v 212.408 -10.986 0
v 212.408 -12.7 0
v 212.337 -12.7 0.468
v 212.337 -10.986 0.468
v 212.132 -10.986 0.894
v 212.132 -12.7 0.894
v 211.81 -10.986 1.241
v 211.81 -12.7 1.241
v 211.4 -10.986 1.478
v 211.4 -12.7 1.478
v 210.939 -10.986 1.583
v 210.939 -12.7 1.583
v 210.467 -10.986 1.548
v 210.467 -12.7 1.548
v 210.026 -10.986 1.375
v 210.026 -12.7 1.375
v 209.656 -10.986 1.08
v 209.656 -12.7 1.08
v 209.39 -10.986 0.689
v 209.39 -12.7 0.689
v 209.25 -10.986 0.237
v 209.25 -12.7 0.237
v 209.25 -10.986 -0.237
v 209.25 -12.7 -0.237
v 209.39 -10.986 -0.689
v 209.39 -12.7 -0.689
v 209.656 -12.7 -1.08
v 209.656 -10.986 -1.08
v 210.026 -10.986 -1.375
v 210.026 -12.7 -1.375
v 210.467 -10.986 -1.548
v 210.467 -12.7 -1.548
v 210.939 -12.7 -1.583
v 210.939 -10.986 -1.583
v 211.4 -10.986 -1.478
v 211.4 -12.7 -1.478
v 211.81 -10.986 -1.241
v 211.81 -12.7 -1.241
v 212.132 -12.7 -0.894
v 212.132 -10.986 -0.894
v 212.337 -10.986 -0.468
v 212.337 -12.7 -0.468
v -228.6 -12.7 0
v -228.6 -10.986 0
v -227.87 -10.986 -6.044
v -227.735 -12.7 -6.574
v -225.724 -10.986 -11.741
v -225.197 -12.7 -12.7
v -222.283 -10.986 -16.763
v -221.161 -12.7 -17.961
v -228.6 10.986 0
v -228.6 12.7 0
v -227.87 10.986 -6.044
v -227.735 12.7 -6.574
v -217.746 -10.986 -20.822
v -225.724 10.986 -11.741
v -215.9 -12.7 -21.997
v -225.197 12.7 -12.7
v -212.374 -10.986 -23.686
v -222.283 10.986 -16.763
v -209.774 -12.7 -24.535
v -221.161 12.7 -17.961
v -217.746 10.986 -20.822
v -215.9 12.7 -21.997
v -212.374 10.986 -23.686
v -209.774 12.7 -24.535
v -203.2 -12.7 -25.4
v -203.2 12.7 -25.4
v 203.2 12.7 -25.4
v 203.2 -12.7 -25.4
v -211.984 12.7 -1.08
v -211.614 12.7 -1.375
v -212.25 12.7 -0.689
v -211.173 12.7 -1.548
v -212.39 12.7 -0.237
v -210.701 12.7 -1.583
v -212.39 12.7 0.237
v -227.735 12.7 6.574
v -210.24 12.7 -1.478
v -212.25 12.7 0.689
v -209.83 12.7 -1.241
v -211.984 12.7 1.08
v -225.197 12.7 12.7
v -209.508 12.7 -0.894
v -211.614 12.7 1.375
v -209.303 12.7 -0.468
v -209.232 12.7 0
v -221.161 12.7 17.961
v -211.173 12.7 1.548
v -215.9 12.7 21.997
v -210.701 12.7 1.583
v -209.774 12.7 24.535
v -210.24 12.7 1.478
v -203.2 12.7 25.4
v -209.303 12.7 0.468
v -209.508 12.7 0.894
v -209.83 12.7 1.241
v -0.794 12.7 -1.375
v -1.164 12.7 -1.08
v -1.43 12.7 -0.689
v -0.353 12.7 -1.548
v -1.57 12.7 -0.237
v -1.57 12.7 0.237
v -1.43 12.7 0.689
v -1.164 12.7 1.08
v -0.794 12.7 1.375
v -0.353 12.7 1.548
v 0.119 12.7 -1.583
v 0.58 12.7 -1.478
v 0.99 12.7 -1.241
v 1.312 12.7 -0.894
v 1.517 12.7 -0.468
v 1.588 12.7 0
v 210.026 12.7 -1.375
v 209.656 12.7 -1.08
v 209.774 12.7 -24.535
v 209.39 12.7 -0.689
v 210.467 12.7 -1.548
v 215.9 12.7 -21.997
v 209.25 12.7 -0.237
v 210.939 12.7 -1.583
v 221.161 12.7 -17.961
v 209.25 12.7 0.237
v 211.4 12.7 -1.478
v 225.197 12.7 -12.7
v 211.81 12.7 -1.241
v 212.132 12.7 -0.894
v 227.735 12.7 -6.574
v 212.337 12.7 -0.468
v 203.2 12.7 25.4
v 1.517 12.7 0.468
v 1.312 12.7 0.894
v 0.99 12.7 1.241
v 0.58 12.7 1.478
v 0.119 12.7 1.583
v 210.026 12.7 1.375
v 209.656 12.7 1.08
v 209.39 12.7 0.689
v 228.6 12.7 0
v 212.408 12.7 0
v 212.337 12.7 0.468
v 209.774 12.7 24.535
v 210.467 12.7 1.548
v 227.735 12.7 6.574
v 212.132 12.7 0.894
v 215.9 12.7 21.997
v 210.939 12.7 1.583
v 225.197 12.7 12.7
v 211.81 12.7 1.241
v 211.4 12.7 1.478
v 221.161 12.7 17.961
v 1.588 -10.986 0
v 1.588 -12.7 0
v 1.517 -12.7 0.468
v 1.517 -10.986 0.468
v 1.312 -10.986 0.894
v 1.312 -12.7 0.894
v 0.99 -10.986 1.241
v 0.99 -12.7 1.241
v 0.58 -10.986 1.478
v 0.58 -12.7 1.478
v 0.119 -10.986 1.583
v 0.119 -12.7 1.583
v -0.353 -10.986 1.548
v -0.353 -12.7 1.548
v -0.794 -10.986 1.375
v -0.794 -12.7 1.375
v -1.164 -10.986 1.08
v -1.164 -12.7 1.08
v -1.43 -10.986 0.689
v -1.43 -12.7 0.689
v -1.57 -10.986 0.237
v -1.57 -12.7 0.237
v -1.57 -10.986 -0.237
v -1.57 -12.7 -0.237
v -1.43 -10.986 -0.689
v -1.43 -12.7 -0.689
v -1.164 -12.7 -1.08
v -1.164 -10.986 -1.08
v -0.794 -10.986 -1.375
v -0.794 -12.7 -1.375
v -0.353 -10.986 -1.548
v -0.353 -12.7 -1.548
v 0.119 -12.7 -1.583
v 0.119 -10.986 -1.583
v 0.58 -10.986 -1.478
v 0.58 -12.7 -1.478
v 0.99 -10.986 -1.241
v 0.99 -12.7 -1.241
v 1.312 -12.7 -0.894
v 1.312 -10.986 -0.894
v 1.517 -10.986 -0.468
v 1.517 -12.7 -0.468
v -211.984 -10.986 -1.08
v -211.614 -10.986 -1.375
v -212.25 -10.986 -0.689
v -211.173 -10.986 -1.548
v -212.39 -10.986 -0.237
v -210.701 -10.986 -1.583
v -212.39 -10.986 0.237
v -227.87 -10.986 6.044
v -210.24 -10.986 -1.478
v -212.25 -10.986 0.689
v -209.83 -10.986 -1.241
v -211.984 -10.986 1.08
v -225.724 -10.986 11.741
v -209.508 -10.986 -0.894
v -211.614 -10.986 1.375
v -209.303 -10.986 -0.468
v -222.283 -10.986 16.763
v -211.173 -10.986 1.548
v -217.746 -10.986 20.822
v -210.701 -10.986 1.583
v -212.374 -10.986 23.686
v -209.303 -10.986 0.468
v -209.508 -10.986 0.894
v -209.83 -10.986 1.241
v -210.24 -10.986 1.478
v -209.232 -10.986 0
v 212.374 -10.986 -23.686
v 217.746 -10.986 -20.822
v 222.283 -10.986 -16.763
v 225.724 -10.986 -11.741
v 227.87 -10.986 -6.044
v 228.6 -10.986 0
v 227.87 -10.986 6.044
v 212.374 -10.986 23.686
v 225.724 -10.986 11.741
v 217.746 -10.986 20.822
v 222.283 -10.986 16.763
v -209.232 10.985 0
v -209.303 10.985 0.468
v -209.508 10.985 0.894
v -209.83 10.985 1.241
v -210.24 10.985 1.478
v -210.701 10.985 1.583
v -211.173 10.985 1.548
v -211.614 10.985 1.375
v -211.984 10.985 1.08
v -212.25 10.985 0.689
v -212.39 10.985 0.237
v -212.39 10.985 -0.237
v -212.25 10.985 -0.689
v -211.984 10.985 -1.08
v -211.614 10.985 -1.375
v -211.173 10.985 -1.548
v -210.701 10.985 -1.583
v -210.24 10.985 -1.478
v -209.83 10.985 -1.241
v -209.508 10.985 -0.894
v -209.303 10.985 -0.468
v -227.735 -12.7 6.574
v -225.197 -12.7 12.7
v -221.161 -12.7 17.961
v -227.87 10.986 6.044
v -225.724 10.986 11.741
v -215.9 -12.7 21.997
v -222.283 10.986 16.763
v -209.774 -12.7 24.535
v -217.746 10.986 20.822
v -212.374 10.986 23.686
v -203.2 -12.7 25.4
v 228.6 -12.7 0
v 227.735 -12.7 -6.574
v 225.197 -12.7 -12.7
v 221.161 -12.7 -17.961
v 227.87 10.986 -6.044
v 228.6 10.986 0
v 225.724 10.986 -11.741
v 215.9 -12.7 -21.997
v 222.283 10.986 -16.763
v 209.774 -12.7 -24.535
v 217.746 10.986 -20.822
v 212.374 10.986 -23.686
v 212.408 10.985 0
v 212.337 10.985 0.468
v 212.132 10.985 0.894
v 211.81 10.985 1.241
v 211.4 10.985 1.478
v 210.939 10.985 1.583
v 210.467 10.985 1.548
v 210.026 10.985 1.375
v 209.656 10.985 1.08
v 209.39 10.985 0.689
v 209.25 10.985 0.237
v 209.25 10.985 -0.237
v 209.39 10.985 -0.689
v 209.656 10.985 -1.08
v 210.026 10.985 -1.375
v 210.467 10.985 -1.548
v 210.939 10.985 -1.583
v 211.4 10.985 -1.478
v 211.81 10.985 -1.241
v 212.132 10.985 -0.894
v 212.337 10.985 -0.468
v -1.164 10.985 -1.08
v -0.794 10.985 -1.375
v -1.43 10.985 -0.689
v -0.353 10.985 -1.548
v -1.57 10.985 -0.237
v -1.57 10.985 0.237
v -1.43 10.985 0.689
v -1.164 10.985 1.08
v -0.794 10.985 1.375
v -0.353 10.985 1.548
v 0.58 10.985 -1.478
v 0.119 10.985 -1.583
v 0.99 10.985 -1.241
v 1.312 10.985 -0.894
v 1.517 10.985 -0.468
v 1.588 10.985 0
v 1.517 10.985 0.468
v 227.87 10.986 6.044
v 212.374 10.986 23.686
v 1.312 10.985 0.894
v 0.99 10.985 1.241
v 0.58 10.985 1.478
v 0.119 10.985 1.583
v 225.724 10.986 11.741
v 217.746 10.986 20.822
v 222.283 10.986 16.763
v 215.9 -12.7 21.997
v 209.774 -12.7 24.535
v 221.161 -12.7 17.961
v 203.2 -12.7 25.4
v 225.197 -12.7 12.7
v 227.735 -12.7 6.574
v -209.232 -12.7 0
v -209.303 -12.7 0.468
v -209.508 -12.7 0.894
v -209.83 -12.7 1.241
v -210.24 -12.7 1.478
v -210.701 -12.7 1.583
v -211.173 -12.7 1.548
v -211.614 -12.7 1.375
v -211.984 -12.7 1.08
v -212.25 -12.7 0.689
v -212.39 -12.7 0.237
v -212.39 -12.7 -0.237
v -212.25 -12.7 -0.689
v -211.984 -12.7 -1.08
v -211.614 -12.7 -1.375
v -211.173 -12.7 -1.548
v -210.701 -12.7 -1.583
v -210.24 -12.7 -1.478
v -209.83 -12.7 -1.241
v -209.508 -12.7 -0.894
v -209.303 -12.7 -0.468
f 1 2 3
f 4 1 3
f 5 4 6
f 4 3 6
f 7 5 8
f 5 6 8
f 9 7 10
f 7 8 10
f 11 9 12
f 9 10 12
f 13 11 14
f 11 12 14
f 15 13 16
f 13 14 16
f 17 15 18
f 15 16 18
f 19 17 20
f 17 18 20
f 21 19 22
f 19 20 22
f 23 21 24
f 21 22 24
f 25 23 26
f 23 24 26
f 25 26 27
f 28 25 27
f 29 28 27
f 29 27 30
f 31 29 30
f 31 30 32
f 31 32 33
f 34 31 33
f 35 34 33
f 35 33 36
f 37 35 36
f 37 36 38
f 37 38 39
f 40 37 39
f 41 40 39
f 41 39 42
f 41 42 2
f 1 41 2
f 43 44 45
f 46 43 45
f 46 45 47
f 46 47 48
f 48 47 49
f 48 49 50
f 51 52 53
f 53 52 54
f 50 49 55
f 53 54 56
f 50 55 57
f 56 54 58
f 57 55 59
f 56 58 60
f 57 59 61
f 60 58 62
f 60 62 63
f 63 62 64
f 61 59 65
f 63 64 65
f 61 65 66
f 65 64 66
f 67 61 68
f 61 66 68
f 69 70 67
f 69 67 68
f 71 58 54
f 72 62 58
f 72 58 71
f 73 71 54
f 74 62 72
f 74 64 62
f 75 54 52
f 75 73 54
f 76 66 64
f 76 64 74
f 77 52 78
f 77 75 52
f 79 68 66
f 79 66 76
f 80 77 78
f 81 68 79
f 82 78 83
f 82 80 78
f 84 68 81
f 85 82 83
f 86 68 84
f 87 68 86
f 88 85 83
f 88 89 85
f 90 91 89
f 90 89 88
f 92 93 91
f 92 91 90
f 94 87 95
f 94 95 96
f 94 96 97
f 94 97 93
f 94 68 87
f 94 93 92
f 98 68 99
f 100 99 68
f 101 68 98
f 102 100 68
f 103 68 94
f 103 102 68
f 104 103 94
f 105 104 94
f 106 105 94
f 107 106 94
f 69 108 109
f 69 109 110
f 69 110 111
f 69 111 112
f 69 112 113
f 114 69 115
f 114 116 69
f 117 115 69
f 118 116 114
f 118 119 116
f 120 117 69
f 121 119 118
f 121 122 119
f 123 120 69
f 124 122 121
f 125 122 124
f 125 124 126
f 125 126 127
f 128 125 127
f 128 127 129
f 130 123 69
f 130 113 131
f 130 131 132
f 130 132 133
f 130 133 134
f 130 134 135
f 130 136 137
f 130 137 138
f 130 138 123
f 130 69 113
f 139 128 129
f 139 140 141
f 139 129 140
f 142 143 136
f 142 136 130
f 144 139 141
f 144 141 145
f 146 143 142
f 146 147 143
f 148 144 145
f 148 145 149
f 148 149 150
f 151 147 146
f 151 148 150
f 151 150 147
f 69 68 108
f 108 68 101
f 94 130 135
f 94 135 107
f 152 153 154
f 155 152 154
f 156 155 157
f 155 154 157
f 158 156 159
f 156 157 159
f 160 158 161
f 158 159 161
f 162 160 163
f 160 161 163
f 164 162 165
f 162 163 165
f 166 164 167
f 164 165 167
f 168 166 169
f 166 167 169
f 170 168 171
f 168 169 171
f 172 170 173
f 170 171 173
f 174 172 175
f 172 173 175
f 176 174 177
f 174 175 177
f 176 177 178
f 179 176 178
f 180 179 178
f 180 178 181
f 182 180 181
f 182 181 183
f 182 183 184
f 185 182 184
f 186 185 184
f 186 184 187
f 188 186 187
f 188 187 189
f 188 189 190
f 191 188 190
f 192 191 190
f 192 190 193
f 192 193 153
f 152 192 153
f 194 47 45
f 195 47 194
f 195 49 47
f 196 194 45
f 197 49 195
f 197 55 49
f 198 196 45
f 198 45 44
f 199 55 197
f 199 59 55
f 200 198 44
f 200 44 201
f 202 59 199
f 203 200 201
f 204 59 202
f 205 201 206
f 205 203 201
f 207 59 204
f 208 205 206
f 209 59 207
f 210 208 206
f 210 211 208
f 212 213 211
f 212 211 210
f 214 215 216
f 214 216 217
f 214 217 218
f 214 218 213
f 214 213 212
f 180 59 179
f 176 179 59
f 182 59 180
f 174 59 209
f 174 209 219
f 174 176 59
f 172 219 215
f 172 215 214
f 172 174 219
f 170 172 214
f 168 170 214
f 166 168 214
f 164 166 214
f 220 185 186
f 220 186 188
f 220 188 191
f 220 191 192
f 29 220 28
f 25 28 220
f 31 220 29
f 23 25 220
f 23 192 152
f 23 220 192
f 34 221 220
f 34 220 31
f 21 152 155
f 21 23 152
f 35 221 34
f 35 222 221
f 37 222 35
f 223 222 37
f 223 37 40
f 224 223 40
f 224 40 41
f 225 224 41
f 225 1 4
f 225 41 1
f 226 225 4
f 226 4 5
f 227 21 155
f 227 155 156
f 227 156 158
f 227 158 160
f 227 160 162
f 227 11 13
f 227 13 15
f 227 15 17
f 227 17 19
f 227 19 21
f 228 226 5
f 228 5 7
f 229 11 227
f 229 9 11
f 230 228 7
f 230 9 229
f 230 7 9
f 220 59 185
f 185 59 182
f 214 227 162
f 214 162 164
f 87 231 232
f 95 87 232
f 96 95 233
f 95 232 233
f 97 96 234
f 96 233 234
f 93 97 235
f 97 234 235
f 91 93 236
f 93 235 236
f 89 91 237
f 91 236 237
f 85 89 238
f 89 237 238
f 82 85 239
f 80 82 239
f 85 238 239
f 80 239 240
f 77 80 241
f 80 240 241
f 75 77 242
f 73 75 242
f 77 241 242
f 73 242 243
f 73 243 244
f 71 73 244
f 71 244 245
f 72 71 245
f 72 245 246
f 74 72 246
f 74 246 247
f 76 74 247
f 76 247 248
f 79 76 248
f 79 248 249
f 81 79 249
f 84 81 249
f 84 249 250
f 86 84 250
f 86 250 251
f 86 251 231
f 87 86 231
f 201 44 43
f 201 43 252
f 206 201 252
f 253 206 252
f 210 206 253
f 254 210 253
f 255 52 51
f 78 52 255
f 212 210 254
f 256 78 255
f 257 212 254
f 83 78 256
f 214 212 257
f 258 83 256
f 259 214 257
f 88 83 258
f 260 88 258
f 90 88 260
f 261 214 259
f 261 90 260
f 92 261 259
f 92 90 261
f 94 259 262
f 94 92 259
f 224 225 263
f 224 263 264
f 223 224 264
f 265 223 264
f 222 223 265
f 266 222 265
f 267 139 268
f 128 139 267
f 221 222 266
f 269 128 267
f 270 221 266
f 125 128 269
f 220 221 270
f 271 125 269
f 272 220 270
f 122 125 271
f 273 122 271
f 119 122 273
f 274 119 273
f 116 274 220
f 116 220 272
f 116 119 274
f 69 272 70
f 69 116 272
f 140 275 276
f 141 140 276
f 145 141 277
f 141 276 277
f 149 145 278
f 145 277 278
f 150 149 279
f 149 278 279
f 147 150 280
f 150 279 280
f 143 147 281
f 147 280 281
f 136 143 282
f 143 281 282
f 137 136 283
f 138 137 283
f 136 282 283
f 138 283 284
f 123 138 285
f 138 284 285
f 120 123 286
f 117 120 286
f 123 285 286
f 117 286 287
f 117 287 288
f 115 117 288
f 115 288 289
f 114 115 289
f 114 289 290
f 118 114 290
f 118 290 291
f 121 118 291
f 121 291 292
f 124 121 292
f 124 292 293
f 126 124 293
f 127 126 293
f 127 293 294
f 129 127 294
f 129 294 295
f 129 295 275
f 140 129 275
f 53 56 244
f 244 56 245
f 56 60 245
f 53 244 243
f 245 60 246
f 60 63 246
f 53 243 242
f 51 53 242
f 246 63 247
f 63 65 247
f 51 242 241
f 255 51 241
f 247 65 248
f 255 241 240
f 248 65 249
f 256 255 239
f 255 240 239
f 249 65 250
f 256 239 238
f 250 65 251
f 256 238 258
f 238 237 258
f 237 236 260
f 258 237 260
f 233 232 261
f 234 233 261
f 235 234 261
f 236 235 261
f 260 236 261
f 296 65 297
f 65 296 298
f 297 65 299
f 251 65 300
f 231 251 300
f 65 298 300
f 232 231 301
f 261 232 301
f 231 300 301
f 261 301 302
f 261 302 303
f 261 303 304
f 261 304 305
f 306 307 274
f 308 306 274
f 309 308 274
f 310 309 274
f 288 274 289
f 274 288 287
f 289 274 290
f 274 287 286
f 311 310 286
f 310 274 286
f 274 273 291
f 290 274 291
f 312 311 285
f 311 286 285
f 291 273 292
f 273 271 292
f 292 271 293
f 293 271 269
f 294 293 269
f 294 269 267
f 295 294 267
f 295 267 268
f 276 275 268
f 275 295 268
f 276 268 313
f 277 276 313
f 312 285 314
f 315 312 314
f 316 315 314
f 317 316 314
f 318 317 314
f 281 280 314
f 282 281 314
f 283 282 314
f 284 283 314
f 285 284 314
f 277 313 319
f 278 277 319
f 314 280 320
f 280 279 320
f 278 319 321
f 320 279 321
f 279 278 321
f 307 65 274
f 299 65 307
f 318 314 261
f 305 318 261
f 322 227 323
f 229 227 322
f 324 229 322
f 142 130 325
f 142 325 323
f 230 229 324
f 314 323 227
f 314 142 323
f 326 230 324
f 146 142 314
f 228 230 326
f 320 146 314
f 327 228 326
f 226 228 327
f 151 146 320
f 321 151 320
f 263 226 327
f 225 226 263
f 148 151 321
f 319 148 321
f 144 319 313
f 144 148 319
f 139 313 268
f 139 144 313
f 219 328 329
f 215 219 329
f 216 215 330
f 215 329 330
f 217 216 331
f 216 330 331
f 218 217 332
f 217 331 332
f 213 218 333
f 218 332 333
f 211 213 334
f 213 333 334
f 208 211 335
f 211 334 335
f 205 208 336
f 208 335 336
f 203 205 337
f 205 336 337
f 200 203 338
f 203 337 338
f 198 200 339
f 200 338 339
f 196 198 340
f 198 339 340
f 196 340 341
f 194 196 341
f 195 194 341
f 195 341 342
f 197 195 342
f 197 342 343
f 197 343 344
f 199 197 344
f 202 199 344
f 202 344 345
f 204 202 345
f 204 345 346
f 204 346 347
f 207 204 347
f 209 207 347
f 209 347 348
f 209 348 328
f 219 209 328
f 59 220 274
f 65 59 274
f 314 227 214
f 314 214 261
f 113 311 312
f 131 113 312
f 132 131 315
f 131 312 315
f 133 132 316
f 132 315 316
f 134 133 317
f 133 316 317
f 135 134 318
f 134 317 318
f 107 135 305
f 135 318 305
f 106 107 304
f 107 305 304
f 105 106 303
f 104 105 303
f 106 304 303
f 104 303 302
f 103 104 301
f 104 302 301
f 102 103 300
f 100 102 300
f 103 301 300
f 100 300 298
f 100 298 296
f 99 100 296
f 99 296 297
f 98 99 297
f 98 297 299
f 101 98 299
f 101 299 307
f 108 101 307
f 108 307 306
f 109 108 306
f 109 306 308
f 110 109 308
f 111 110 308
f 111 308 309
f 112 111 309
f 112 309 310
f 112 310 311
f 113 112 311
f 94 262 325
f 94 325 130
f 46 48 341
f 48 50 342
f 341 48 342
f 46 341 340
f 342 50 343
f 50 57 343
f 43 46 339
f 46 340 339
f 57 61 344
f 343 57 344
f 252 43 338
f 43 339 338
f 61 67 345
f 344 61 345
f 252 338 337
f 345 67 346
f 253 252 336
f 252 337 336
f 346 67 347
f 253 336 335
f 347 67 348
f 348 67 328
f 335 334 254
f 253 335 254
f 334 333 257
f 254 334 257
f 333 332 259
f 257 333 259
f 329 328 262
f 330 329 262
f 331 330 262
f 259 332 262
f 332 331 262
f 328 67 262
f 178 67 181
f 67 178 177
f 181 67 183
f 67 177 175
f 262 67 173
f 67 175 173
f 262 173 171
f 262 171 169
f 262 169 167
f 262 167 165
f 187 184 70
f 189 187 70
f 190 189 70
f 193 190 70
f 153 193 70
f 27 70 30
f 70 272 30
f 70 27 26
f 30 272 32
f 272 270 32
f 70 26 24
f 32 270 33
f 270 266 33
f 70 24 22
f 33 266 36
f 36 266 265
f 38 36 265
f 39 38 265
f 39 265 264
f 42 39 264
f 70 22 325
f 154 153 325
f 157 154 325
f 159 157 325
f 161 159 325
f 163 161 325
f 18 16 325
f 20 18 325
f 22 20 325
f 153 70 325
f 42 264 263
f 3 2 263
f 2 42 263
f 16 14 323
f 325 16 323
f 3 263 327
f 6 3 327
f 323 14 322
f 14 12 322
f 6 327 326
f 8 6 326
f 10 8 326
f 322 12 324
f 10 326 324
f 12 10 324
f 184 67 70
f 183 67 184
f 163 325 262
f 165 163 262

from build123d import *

# Parameters (mm, degrees)
F0_W        = 25.4
F0_H        = 50.8
F1_DEPTH    = 228.6
F2_W        = 21.971
F2_H        = 47.371
F3_DEPTH    = 457.201
F4_R        = 1.5875
F5_DEPTH    = 25.401
F6_R        = 1.5875
F7_DEPTH    = 25.401
F8_T1_DEPTH = 152.4
F9_T1_DEPTH = 152.4


# Not quite as in the source:
# - a fillet or chamfer that OpenCascade refuses, or shapes differently, is made with other operations: its cross-section is extruded or revolved along the edge and cut away or added


with BuildPart() as f1:
    # F0 (on Right) → F1 (new body, symmetric)
    with BuildSketch(Plane.YZ):
        Rectangle(F0_W, F0_H)
    extrude(amount=F1_DEPTH, both=True)

    # F2 (on face) → F3 (cut, through all)
    with BuildSketch(Plane.YZ.offset(228.6)):
        Rectangle(F2_W, F2_H)
    extrude(amount=-F3_DEPTH, mode=Mode.SUBTRACT)

    # F4 (on face) → F5 (cut, through all)
    with BuildSketch(Plane.XZ.offset(12.7)):
        with Locations((-210.82, 0)):
            Circle(F4_R)
        Circle(F4_R)
    extrude(amount=-F5_DEPTH, mode=Mode.SUBTRACT)

    # F6 (on face) → F7 (cut, through all)
    with BuildSketch(Plane.XZ.offset(12.7)):
        with Locations((210.82, 0)):
            Circle(F6_R)
    extrude(amount=-F7_DEPTH, mode=Mode.SUBTRACT)

    # F8: fillet of radius 25.4 on 2 edges, made by hand

    # F8_s2 → F8_t1 (cut)
    with BuildSketch(Plane.XZ.offset(-76.2)):
        with BuildLine():
            ThreePointArc((-228.6, 0), (-221.1605122421, -17.9605122421), (-203.2, -25.4))
            Line((-203.2, -25.4), (-228.6, -25.4))
            Line((-228.6, -25.4), (-228.6, 0))
        make_face()
        with BuildLine():
            ThreePointArc((-228.6, 0), (-221.1605122421, 17.9605122421), (-203.2, 25.4))
            Line((-203.2, 25.4), (-228.6, 25.4))
            Line((-228.6, 25.4), (-228.6, 0))
        make_face()
    extrude(amount=F8_T1_DEPTH, mode=Mode.SUBTRACT)

    # F9: fillet of radius 25.4 on 2 edges, made by hand

    # F9_s2 → F9_t1 (cut)
    with BuildSketch(Plane.XZ.offset(-76.2)):
        with BuildLine():
            ThreePointArc((203.2, 25.4), (221.1605122421, 17.9605122421), (228.6, 0))
            Line((228.6, 0), (228.6, 25.4))
            Line((228.6, 25.4), (203.2, 25.4))
        make_face()
        with BuildLine():
            ThreePointArc((228.6, 0), (221.1605122421, -17.9605122421), (203.2, -25.4))
            Line((203.2, -25.4), (228.6, -25.4))
            Line((228.6, -25.4), (228.6, 0))
        make_face()
    extrude(amount=F9_T1_DEPTH, mode=Mode.SUBTRACT)


solid = f1.part
